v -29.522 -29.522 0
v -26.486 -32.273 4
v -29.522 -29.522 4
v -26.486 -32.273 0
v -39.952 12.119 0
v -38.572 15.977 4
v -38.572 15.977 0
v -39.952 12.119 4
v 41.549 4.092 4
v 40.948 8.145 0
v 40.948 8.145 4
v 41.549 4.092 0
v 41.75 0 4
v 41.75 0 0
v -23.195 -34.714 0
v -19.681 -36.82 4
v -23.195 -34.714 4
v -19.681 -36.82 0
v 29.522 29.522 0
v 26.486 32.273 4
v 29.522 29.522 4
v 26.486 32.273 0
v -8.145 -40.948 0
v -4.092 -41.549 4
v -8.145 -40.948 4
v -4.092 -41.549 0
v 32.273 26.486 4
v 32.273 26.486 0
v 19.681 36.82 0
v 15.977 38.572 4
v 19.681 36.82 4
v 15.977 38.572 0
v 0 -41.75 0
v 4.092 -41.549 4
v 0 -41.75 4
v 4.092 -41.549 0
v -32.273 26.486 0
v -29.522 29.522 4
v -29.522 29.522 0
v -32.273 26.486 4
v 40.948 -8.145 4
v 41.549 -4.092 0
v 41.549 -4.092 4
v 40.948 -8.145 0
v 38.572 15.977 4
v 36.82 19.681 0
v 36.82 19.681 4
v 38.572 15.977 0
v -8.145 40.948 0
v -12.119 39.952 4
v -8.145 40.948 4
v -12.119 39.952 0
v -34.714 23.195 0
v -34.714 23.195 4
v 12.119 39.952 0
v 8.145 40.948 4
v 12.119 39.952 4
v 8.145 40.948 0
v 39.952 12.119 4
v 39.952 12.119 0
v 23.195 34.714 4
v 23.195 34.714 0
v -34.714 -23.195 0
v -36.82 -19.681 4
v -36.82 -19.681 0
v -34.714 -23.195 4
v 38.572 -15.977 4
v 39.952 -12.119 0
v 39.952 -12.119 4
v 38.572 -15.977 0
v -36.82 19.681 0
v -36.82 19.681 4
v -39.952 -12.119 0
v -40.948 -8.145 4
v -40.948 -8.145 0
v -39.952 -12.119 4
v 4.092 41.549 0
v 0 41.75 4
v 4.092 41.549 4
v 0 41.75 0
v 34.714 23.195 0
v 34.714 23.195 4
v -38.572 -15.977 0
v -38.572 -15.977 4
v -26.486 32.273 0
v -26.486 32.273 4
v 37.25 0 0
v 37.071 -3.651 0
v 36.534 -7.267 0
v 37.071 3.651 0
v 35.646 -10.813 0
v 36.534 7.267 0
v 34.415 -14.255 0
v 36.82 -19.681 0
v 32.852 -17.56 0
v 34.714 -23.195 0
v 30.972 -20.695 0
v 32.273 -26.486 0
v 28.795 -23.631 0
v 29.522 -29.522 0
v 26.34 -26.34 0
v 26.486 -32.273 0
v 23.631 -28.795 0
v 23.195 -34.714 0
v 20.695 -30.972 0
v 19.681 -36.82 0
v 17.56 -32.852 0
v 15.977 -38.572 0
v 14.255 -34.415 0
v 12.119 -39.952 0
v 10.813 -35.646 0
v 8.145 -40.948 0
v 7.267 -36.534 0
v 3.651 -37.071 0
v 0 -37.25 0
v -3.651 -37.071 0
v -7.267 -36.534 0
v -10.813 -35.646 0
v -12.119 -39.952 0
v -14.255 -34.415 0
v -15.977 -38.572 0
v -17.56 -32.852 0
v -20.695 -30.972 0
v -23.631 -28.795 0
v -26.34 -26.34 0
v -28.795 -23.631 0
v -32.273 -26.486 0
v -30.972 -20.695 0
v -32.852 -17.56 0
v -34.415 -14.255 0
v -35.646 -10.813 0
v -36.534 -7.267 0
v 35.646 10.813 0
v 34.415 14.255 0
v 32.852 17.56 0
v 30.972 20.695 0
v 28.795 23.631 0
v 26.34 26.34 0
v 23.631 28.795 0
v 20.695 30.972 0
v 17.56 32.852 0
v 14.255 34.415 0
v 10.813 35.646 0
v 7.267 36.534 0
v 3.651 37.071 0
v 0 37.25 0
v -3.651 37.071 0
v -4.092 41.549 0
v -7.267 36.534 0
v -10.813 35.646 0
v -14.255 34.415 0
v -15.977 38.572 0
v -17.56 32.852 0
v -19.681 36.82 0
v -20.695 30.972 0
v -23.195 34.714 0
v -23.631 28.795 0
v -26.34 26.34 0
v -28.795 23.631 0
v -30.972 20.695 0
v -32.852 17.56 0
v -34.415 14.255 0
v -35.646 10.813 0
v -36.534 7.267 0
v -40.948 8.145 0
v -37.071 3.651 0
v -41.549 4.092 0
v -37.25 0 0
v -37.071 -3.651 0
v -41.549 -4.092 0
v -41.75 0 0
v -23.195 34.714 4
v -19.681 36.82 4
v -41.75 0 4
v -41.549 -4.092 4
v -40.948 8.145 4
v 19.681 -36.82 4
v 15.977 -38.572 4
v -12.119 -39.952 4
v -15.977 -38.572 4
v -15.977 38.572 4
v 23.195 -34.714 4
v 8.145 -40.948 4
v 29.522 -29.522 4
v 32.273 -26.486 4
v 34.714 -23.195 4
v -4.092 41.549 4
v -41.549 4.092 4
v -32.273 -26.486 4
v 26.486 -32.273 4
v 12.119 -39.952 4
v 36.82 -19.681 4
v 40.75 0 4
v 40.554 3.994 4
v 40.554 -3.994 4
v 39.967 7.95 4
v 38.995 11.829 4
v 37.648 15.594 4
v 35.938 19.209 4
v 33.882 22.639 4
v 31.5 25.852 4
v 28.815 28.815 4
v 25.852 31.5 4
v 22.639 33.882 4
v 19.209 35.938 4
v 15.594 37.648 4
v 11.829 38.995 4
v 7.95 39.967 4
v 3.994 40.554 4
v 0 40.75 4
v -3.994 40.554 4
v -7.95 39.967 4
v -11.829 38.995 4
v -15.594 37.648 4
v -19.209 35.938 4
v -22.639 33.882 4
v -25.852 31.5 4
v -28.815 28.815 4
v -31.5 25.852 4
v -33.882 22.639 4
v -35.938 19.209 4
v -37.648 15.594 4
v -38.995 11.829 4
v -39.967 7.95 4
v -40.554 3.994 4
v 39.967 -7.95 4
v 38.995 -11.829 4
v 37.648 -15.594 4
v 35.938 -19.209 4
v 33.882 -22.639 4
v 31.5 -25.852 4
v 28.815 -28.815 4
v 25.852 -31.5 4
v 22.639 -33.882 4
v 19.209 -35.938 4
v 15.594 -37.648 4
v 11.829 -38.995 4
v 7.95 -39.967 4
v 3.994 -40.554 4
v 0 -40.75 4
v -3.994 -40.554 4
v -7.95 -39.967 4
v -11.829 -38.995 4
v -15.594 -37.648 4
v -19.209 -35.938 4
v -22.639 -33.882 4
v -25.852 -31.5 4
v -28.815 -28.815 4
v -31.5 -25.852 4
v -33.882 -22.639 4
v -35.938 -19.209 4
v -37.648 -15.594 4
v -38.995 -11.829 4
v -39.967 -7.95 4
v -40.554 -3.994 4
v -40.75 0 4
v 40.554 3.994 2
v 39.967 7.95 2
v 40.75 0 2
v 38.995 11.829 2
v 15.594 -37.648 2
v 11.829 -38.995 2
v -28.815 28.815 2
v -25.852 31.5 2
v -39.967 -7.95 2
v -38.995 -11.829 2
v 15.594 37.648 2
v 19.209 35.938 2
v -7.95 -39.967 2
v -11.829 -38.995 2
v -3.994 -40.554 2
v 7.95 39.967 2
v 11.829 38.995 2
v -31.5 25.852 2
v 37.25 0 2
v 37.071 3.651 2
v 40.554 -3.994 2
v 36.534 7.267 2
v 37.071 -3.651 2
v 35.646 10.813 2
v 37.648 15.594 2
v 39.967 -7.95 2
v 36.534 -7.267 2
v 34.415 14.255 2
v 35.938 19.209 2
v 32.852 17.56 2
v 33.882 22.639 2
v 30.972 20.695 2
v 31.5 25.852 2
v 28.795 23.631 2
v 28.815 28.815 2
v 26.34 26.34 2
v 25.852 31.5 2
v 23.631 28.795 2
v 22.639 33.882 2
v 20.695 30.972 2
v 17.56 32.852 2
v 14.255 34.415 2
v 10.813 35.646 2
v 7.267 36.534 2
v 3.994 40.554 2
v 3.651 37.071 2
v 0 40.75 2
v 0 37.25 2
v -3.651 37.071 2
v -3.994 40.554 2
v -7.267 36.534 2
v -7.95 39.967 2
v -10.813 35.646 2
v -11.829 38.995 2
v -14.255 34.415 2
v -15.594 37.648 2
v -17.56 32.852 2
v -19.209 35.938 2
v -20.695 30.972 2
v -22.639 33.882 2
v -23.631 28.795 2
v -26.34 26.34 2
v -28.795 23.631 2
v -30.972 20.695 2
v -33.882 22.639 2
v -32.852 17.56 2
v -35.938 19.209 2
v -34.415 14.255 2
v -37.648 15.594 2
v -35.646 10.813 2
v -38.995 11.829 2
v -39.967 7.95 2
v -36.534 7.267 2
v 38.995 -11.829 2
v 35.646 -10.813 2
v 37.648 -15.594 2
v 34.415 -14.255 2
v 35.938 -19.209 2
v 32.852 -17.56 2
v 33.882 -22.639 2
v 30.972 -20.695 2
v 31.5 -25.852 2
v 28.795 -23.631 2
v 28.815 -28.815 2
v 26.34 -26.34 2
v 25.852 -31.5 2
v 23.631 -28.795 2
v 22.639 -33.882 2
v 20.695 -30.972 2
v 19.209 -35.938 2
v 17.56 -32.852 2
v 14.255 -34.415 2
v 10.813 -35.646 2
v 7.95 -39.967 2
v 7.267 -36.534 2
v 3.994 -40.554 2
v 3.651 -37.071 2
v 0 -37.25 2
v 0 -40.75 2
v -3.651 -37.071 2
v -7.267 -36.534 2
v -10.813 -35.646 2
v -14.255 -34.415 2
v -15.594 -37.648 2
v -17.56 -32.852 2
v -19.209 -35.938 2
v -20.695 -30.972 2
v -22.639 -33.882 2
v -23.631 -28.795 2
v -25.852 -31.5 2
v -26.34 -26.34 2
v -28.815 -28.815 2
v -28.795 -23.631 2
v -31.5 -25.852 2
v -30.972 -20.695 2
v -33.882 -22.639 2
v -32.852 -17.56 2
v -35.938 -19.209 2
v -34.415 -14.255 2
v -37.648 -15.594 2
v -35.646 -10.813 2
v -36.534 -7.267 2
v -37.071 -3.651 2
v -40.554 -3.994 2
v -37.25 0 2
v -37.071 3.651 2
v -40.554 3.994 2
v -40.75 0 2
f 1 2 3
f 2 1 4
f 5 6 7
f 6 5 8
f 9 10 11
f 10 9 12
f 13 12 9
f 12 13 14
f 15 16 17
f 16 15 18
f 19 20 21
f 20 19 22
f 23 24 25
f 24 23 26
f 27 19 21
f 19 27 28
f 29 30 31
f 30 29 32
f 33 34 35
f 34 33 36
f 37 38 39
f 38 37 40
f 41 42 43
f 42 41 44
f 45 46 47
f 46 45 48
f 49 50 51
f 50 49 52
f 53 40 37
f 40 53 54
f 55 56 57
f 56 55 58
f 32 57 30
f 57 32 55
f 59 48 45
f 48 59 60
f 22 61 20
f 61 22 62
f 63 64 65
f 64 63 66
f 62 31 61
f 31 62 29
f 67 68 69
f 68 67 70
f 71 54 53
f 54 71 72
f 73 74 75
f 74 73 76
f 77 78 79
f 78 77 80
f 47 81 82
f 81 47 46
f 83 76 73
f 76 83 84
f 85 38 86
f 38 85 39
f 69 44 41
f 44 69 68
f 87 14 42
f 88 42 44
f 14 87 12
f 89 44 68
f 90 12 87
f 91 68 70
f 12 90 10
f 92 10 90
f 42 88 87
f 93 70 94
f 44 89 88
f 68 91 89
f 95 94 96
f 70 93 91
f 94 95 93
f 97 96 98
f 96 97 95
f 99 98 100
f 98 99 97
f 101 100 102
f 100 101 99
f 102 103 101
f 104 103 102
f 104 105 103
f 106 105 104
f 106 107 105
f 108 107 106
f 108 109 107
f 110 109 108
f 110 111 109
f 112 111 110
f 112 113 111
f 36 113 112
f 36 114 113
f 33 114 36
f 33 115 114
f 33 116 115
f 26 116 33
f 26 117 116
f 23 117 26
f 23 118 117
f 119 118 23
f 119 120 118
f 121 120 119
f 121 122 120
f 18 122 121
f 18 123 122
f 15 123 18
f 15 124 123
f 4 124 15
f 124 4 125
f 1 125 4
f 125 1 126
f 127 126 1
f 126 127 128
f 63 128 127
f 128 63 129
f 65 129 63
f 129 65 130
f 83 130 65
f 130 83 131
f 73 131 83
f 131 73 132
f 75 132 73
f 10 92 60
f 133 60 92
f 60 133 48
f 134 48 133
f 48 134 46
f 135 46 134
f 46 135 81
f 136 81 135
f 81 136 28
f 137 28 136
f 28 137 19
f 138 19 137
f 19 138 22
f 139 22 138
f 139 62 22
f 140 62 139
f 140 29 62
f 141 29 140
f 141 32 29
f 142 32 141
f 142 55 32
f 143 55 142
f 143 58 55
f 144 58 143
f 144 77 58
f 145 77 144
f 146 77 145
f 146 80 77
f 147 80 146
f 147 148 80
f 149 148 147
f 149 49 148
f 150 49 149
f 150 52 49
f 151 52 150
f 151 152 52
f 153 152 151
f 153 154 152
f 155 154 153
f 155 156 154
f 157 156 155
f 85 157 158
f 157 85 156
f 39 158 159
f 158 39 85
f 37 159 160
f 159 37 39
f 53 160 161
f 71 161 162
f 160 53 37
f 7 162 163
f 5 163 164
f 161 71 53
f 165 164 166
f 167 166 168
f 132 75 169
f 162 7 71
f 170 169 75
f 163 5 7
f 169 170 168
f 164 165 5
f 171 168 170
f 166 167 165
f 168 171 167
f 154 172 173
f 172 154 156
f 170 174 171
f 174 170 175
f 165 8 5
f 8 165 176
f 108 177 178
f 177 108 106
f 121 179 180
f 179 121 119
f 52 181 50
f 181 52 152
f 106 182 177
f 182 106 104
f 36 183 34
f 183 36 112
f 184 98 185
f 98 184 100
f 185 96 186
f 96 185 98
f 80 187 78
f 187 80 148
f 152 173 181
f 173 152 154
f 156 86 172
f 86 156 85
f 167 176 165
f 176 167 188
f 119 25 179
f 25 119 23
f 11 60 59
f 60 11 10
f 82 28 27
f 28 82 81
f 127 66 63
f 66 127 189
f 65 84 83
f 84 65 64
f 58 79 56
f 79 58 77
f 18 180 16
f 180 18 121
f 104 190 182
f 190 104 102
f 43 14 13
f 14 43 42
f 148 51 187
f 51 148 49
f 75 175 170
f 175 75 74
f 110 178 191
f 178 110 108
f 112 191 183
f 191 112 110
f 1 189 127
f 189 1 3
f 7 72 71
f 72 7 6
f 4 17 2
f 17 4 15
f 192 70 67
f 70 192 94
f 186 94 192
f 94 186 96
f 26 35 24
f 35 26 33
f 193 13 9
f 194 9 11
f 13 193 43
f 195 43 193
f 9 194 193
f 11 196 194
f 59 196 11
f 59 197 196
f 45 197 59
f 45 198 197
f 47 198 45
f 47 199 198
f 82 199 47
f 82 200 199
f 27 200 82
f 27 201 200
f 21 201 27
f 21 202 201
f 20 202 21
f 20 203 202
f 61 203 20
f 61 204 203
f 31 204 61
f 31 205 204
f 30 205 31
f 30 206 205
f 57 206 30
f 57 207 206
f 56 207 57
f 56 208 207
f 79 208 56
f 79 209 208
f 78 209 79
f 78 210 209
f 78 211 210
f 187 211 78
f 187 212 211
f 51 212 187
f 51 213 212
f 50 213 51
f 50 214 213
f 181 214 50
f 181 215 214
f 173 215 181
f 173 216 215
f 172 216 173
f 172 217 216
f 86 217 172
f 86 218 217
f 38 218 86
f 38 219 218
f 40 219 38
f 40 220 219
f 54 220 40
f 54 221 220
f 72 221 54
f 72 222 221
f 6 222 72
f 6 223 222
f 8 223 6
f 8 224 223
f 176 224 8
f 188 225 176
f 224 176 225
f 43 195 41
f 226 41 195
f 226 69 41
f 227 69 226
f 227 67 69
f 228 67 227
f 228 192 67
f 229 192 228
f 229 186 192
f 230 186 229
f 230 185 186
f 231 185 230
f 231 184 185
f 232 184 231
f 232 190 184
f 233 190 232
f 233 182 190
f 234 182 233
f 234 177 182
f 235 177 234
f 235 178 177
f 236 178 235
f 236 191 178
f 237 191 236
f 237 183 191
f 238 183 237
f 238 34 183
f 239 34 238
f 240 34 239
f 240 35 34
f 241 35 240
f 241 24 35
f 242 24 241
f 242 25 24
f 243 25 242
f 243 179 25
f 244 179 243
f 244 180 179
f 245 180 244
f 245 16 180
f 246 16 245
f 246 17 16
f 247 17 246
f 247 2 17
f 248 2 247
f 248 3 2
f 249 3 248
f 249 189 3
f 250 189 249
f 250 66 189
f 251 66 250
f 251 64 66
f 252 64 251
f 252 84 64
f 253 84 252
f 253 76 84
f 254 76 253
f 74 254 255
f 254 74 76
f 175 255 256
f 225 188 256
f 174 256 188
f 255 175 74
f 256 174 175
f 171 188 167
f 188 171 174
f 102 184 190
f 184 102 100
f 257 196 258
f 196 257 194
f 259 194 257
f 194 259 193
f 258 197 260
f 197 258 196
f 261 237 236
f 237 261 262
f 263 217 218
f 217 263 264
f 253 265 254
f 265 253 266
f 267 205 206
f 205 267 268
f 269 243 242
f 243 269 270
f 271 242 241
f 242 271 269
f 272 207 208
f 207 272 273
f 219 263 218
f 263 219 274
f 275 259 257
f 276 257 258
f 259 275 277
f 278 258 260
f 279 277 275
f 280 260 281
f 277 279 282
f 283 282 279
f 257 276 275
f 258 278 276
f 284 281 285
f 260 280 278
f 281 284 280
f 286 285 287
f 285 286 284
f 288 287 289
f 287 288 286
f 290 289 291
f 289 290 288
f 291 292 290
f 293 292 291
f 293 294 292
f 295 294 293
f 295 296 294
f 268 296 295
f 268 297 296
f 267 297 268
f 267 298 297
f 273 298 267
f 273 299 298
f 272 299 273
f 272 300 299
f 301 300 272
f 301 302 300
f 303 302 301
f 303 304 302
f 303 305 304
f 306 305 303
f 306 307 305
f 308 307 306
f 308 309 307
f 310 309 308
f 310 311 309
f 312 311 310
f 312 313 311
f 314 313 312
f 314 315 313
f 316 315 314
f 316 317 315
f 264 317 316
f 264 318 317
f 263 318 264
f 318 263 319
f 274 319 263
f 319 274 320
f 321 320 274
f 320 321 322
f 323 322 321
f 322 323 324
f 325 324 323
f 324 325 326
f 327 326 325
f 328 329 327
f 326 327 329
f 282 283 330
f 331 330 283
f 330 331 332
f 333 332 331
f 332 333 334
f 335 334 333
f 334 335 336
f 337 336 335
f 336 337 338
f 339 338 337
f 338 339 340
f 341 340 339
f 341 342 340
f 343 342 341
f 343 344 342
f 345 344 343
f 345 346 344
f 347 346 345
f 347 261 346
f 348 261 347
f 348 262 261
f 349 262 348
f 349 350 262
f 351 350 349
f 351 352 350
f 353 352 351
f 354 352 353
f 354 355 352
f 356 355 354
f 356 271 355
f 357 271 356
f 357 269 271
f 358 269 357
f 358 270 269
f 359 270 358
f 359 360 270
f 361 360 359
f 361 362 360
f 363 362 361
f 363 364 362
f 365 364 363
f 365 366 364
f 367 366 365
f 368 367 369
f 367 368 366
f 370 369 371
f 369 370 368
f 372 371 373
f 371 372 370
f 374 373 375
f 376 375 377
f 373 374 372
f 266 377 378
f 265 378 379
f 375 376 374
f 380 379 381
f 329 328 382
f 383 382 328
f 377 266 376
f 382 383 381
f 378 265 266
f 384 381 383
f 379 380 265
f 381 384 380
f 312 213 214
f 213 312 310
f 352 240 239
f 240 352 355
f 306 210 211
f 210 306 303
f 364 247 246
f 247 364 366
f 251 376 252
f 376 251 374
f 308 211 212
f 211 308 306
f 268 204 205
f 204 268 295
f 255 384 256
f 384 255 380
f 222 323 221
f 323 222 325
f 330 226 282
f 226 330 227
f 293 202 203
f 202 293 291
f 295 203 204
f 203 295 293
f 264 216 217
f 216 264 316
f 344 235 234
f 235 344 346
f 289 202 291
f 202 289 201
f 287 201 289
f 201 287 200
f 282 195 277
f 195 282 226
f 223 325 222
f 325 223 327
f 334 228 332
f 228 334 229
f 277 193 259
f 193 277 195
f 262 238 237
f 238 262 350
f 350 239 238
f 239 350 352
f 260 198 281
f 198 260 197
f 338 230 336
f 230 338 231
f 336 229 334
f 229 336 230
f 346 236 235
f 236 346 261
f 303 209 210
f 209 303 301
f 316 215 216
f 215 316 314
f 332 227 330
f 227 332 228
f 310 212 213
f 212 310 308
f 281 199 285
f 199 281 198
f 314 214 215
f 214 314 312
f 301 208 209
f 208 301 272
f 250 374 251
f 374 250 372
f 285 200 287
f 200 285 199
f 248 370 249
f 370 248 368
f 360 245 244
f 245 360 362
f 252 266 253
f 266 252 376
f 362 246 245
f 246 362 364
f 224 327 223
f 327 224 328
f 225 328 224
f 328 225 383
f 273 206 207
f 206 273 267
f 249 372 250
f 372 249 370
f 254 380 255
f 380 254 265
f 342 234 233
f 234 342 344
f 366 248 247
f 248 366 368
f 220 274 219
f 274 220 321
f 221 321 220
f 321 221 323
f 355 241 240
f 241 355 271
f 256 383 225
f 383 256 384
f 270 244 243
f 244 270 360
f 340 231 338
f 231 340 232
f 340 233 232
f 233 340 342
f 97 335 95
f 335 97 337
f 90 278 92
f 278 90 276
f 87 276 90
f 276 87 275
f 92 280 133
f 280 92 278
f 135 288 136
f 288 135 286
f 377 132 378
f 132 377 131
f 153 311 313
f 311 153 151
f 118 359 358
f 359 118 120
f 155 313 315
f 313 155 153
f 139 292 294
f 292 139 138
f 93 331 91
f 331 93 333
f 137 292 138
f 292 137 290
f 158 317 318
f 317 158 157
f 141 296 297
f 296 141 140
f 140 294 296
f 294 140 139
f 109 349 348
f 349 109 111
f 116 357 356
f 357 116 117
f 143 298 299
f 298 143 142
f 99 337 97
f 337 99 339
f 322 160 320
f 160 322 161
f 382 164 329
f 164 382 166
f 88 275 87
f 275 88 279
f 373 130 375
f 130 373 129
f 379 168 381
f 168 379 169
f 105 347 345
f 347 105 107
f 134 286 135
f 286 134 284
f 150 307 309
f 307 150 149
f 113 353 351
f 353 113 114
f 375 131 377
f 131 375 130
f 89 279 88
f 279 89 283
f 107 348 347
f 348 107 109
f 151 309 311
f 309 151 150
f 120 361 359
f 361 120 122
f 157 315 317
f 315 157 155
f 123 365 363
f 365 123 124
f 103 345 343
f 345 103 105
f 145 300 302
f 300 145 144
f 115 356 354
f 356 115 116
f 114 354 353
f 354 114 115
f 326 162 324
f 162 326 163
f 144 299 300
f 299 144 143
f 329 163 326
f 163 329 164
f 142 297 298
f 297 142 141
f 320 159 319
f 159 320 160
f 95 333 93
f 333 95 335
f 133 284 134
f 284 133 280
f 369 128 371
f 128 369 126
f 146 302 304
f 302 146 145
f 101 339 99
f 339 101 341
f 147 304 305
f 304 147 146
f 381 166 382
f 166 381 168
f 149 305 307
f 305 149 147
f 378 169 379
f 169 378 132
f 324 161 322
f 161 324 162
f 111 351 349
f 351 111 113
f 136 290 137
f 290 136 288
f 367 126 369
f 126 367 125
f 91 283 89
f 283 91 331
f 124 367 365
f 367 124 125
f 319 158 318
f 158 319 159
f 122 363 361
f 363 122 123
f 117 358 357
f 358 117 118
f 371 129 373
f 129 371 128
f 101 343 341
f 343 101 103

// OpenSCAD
glass_h = 10;
glass_r = 40.75;

outer_shell_h = 4;
outer_shell_r = glass_r + 1;

inner_opening_h = glass_h;
glass_overhand = 3.5;
inner_opening_r = glass_r - glass_overhand;

roundness = 64;

difference() {
    cylinder(h = outer_shell_h, r = outer_shell_r, $fn = roundness);
    translate([0, 0, 2]) {
        cylinder(h = glass_h, r = glass_r, $fn = roundness);
    }
    cylinder(h = inner_opening_h, r = inner_opening_r, $fn = roundness);
}
